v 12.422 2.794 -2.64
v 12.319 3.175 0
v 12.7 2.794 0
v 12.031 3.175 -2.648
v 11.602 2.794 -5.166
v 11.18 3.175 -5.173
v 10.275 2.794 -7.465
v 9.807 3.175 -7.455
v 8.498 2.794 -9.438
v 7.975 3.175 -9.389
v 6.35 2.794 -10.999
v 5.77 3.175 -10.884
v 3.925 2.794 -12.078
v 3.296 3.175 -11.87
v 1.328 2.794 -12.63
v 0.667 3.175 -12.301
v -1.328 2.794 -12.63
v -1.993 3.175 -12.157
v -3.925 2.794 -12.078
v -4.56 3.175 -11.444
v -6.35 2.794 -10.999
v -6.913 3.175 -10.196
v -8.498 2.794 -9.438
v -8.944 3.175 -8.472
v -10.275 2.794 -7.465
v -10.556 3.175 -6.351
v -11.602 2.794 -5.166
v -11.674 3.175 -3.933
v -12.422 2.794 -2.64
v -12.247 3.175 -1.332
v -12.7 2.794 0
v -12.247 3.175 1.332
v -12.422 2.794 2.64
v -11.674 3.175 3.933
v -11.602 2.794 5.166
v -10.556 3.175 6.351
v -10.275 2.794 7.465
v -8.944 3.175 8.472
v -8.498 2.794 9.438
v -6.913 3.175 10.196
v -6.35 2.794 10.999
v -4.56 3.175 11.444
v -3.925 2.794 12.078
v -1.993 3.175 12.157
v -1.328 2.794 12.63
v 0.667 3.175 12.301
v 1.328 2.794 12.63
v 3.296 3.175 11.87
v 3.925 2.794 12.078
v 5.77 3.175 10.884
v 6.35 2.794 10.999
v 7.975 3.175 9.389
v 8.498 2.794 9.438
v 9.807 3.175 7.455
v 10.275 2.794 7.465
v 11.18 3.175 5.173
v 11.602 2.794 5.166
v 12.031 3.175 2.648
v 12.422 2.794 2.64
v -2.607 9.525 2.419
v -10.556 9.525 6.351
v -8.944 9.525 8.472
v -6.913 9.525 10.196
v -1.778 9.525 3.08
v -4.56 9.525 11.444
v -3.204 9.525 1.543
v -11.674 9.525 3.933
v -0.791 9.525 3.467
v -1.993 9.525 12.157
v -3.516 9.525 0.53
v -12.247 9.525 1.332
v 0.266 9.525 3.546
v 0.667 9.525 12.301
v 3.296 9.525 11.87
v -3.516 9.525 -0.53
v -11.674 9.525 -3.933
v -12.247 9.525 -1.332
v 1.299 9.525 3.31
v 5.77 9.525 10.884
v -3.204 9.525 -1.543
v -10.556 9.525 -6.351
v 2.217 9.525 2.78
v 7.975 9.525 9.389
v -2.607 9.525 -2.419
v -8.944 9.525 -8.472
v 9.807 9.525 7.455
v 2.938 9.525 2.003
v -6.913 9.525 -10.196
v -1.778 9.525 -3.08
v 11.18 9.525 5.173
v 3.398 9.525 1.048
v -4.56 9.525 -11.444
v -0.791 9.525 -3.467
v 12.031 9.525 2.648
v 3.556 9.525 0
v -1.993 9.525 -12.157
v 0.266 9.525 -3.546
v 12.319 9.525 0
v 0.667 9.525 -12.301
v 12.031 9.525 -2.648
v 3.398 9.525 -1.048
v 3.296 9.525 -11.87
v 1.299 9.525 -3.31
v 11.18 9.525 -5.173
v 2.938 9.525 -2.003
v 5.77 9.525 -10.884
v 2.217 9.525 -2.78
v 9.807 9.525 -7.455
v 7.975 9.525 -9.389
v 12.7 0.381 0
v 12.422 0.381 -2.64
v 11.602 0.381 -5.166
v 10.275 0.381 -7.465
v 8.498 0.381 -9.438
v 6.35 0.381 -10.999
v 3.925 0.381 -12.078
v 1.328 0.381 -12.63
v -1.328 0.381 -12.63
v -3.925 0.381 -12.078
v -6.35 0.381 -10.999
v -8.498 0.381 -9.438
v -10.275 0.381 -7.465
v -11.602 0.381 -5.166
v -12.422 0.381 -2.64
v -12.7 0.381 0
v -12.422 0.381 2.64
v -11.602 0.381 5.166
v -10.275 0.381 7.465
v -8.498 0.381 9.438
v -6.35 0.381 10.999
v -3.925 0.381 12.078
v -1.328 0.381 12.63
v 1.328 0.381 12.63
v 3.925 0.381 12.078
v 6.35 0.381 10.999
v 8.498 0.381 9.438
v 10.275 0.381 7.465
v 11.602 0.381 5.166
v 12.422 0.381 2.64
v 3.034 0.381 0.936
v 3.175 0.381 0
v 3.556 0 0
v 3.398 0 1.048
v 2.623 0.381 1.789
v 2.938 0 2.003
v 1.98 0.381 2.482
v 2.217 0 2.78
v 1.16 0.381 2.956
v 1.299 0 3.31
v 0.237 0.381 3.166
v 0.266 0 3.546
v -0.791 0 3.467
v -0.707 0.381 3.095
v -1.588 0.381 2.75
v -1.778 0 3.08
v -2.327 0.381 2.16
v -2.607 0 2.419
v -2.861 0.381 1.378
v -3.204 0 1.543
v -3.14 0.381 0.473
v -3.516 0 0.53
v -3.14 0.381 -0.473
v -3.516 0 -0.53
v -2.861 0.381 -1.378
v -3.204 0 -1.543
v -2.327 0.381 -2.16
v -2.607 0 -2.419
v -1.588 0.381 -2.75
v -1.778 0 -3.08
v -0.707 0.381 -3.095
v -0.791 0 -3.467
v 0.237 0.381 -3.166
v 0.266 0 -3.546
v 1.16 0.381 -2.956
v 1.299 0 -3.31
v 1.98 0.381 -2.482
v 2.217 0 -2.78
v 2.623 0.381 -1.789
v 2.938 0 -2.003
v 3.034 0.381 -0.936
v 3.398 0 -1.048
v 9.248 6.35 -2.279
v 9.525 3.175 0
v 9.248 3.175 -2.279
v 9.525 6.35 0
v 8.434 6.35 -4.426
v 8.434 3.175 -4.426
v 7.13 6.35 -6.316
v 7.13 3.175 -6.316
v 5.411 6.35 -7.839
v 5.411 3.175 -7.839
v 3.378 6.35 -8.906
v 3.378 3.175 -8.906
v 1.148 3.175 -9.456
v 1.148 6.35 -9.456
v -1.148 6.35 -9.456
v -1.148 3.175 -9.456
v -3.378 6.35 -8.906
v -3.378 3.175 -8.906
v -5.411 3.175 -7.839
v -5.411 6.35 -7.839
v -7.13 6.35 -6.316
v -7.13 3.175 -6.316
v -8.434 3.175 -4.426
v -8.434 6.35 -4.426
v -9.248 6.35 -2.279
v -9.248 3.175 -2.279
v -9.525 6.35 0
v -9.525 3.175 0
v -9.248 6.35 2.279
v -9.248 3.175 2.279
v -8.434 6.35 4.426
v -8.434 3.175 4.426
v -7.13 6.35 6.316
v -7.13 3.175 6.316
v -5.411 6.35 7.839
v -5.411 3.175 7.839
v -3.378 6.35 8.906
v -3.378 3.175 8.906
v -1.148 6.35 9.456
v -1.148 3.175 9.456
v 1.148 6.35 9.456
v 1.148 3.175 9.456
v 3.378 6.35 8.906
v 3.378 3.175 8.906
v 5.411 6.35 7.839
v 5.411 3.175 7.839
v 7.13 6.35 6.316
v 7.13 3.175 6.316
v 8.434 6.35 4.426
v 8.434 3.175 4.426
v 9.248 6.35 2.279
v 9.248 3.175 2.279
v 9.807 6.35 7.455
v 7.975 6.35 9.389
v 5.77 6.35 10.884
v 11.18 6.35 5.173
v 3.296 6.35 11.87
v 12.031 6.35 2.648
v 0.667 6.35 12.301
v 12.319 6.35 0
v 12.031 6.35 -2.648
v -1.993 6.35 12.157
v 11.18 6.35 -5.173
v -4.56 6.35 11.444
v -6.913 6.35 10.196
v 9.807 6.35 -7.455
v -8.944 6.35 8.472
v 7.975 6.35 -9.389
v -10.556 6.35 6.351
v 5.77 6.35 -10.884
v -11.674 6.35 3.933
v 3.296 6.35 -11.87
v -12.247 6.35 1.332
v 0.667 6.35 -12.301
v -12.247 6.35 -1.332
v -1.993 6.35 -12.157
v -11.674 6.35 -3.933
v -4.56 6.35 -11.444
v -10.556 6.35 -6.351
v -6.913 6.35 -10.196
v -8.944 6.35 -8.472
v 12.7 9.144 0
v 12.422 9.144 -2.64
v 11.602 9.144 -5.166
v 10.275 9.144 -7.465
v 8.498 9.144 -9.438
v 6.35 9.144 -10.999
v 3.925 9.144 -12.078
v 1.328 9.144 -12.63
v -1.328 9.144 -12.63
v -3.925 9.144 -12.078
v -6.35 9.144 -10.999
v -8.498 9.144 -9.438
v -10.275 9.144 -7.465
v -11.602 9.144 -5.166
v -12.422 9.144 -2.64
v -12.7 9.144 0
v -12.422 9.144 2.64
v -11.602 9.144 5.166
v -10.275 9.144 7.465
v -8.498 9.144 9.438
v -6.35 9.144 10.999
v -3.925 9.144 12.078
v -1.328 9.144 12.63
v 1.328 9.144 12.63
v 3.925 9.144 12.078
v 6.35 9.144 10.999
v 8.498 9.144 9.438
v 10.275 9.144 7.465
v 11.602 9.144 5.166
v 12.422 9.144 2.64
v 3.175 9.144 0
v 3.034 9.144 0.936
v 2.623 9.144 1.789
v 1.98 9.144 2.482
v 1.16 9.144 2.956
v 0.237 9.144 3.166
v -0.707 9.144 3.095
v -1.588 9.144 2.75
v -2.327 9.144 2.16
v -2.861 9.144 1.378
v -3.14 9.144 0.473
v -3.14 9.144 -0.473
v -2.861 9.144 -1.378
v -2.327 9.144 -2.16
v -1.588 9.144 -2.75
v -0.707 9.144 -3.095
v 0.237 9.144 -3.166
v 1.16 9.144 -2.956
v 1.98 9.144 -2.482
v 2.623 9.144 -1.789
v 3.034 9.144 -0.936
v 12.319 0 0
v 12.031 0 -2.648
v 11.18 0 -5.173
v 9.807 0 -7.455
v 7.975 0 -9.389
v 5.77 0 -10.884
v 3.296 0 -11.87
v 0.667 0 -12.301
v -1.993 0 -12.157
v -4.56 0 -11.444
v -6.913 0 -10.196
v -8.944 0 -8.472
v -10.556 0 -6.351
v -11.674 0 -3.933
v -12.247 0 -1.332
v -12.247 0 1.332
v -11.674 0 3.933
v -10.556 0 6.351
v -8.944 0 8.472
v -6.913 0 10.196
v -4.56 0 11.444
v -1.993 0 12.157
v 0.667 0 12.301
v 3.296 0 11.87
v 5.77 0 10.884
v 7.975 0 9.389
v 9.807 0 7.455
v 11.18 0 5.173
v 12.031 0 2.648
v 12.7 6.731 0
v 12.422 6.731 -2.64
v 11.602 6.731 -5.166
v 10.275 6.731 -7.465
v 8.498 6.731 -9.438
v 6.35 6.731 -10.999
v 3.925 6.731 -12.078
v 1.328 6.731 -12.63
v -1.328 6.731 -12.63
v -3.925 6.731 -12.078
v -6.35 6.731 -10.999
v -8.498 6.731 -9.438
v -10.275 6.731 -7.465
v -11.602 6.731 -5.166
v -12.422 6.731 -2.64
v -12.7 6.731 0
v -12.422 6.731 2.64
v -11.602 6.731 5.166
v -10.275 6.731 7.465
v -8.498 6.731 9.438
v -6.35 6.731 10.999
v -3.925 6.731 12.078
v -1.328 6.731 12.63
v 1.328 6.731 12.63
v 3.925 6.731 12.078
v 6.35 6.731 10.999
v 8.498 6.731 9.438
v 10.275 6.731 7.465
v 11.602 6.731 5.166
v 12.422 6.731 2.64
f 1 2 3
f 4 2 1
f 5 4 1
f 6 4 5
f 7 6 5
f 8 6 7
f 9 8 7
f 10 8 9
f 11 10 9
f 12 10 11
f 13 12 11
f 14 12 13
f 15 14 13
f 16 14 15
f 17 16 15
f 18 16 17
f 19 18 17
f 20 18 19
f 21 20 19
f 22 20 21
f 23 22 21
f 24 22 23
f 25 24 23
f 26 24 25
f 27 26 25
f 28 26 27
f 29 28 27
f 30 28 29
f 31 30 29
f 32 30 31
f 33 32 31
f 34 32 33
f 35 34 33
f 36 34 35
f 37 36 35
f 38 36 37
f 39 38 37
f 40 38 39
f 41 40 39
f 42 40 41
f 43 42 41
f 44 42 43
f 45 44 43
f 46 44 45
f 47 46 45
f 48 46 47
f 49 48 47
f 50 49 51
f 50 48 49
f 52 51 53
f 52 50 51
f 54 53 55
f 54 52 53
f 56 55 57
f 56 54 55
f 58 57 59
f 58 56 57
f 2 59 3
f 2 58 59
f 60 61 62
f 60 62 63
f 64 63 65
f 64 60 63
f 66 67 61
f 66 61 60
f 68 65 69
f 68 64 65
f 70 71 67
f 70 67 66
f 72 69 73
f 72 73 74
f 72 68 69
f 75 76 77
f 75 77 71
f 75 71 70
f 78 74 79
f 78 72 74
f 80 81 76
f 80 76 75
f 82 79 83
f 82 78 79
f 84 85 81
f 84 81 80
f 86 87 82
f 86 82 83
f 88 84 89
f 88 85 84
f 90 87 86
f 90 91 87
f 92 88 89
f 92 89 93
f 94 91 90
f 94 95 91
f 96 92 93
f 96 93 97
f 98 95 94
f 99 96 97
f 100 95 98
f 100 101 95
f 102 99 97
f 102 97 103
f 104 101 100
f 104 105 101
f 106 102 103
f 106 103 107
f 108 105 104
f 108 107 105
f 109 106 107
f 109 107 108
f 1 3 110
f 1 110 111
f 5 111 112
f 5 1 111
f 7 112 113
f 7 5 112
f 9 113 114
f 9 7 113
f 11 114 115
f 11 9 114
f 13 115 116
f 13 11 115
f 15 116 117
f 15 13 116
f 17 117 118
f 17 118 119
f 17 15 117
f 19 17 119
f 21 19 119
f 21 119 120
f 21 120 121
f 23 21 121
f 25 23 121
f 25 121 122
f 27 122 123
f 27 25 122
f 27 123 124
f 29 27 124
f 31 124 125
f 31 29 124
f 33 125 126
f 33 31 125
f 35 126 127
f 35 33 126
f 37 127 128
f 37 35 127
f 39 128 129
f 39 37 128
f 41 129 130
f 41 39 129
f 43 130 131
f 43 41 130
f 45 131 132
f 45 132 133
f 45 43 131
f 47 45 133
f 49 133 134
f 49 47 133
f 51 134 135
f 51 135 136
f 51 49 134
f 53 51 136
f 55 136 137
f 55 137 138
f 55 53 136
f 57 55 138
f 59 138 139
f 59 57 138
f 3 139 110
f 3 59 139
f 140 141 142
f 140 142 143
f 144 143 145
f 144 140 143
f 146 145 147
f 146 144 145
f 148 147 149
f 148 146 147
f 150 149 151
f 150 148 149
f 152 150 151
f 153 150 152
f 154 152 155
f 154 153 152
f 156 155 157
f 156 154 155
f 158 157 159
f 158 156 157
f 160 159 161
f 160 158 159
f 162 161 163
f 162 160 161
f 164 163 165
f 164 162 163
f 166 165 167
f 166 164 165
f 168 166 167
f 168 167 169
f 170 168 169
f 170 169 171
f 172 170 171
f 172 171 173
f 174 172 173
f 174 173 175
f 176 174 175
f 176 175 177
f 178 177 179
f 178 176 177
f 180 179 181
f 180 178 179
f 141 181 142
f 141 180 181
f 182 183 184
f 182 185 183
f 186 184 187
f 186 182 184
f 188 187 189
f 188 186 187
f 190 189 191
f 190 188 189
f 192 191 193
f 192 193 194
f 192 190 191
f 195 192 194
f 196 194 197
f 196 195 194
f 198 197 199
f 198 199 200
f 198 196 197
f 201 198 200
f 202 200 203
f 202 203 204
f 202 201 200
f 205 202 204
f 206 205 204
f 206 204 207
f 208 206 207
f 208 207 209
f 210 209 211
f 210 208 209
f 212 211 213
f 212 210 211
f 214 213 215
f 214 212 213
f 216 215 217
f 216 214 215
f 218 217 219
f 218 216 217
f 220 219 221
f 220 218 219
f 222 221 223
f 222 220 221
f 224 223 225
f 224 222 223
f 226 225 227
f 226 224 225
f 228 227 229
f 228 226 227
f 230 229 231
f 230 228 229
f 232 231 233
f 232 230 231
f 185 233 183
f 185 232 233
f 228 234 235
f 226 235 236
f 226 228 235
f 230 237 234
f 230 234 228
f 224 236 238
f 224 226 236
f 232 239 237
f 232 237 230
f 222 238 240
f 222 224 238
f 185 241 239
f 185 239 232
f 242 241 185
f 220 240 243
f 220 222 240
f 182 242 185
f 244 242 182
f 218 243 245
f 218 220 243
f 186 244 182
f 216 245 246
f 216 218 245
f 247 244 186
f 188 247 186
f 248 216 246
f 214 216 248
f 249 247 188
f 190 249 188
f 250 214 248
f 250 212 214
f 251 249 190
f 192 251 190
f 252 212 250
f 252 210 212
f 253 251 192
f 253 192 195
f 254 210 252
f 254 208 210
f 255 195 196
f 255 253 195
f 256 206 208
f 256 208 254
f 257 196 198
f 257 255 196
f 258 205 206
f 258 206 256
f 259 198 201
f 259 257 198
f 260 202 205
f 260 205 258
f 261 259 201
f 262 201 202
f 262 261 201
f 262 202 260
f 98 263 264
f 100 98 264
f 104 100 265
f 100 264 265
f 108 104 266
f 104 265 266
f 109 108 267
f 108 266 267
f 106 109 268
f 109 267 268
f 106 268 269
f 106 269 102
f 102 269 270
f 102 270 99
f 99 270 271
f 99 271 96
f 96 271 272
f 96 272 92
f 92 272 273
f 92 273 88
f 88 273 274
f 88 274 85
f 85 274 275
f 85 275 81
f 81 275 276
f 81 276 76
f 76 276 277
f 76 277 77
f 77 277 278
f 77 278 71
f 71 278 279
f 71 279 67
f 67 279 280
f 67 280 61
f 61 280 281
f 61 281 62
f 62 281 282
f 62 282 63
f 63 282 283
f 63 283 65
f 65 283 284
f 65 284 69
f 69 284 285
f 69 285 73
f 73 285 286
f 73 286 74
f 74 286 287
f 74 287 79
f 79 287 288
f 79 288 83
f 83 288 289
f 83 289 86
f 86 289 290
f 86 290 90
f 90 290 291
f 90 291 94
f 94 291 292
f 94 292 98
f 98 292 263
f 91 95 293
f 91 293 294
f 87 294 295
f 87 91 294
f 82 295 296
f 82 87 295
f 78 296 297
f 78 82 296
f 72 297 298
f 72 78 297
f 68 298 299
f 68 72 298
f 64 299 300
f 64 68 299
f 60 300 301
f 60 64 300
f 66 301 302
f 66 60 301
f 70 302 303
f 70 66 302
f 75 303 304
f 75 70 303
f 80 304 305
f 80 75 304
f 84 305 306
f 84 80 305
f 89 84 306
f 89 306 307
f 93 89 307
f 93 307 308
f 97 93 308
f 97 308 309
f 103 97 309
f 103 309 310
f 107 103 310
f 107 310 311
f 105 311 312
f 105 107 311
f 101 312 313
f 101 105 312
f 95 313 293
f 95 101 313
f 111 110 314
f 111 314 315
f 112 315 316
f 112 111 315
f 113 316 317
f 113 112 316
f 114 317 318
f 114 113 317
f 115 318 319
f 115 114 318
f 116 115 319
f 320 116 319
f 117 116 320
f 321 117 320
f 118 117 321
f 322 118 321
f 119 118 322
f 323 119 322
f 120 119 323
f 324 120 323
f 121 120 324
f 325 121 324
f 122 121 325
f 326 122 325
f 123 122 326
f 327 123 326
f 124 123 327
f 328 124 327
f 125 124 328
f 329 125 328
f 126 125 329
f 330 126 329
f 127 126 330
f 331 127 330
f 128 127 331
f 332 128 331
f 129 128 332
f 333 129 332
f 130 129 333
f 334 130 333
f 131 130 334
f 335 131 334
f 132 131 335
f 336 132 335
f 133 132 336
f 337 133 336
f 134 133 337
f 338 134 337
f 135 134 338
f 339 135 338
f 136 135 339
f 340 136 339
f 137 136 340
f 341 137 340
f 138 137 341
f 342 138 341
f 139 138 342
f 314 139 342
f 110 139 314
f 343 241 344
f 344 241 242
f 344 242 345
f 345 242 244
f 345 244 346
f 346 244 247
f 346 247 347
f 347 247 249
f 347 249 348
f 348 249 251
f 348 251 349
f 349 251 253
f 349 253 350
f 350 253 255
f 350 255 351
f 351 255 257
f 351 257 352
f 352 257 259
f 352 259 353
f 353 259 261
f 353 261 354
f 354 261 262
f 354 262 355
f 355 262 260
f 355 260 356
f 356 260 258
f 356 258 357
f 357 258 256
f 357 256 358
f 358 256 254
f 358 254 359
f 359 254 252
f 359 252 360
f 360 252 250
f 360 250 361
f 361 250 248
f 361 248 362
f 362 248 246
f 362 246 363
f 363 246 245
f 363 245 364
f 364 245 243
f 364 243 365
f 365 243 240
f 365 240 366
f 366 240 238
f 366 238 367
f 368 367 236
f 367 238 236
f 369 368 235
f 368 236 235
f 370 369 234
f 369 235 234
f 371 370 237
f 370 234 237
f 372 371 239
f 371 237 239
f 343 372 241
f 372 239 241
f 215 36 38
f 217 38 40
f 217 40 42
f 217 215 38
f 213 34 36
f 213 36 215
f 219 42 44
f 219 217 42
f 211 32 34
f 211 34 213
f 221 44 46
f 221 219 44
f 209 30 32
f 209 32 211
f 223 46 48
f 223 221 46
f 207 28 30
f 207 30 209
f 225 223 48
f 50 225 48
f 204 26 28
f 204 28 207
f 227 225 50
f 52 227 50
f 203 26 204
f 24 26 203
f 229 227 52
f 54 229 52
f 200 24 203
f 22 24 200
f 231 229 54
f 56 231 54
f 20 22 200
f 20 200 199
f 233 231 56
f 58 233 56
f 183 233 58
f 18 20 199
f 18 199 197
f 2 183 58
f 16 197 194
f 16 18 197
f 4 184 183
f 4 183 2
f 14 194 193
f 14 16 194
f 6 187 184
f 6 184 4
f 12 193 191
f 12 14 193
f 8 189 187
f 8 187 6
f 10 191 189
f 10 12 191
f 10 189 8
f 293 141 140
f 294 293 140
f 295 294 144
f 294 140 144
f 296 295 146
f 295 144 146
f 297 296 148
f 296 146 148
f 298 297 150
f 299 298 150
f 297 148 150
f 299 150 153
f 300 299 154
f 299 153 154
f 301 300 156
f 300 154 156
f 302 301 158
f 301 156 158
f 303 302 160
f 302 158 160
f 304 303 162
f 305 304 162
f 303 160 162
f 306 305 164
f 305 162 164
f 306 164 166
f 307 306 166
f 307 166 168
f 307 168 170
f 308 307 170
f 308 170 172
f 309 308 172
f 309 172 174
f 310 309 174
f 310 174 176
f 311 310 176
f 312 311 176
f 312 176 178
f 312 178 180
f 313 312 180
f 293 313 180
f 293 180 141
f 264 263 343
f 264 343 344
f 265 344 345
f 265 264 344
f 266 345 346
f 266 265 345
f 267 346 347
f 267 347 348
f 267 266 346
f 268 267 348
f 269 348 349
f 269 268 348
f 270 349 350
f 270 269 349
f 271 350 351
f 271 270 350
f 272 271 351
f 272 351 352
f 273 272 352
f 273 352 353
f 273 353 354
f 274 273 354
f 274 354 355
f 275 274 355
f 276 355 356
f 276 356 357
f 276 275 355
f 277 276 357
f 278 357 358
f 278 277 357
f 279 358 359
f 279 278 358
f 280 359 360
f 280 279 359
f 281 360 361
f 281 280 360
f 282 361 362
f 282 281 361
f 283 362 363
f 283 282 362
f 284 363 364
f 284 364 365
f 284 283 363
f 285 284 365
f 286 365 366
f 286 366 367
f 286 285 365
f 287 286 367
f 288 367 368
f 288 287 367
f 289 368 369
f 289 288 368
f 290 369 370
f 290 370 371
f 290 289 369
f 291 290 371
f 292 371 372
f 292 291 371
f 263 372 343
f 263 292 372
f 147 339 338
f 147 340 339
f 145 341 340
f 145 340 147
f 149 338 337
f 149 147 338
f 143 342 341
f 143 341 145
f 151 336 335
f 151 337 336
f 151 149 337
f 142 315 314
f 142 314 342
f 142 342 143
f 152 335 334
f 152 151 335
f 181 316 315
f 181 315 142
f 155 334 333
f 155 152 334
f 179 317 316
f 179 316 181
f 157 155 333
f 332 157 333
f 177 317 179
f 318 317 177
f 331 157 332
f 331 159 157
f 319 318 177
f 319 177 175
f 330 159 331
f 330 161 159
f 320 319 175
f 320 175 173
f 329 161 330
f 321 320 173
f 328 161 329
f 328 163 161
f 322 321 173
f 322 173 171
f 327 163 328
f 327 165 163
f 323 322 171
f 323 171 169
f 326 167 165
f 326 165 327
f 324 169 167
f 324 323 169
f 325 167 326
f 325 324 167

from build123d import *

# Parameters (mm, degrees)
F2_R     = 3.175
F3_DEPTH = 9.526
F4_SIZE  = 0.381


with BuildPart() as f1:
    # F0 (on Top) → F1 (revolve)
    with BuildSketch(Plane.XY):
        Polygon((0, 9.525), (0, 0), (12.7, 0), (12.7, 3.175), (9.525, 3.175), (9.525, 6.35), (12.7, 6.35), (12.7, 9.525), align=None)
    revolve(axis=Axis((0, 4.7625, 0), (0, 1, 0)))

    # F2 (on face) → F3 (cut, through all)
    with BuildSketch(Plane.XZ):
        Circle(F2_R)
    extrude(amount=-F3_DEPTH, mode=Mode.SUBTRACT)

    # F4
    f4_edges = [f1.edges().sort_by_distance(p)[0] for p in [
        (-3.175, 0, 0),
        (-3.175, 9.525, 0),
        (-12.7, 0, 0),
        (-12.7, 3.175, 0),
        (-12.7, 6.35, 0),
        (-12.7, 9.525, 0),
    ]]
    chamfer(f4_edges, length=F4_SIZE)


solid = f1.part
